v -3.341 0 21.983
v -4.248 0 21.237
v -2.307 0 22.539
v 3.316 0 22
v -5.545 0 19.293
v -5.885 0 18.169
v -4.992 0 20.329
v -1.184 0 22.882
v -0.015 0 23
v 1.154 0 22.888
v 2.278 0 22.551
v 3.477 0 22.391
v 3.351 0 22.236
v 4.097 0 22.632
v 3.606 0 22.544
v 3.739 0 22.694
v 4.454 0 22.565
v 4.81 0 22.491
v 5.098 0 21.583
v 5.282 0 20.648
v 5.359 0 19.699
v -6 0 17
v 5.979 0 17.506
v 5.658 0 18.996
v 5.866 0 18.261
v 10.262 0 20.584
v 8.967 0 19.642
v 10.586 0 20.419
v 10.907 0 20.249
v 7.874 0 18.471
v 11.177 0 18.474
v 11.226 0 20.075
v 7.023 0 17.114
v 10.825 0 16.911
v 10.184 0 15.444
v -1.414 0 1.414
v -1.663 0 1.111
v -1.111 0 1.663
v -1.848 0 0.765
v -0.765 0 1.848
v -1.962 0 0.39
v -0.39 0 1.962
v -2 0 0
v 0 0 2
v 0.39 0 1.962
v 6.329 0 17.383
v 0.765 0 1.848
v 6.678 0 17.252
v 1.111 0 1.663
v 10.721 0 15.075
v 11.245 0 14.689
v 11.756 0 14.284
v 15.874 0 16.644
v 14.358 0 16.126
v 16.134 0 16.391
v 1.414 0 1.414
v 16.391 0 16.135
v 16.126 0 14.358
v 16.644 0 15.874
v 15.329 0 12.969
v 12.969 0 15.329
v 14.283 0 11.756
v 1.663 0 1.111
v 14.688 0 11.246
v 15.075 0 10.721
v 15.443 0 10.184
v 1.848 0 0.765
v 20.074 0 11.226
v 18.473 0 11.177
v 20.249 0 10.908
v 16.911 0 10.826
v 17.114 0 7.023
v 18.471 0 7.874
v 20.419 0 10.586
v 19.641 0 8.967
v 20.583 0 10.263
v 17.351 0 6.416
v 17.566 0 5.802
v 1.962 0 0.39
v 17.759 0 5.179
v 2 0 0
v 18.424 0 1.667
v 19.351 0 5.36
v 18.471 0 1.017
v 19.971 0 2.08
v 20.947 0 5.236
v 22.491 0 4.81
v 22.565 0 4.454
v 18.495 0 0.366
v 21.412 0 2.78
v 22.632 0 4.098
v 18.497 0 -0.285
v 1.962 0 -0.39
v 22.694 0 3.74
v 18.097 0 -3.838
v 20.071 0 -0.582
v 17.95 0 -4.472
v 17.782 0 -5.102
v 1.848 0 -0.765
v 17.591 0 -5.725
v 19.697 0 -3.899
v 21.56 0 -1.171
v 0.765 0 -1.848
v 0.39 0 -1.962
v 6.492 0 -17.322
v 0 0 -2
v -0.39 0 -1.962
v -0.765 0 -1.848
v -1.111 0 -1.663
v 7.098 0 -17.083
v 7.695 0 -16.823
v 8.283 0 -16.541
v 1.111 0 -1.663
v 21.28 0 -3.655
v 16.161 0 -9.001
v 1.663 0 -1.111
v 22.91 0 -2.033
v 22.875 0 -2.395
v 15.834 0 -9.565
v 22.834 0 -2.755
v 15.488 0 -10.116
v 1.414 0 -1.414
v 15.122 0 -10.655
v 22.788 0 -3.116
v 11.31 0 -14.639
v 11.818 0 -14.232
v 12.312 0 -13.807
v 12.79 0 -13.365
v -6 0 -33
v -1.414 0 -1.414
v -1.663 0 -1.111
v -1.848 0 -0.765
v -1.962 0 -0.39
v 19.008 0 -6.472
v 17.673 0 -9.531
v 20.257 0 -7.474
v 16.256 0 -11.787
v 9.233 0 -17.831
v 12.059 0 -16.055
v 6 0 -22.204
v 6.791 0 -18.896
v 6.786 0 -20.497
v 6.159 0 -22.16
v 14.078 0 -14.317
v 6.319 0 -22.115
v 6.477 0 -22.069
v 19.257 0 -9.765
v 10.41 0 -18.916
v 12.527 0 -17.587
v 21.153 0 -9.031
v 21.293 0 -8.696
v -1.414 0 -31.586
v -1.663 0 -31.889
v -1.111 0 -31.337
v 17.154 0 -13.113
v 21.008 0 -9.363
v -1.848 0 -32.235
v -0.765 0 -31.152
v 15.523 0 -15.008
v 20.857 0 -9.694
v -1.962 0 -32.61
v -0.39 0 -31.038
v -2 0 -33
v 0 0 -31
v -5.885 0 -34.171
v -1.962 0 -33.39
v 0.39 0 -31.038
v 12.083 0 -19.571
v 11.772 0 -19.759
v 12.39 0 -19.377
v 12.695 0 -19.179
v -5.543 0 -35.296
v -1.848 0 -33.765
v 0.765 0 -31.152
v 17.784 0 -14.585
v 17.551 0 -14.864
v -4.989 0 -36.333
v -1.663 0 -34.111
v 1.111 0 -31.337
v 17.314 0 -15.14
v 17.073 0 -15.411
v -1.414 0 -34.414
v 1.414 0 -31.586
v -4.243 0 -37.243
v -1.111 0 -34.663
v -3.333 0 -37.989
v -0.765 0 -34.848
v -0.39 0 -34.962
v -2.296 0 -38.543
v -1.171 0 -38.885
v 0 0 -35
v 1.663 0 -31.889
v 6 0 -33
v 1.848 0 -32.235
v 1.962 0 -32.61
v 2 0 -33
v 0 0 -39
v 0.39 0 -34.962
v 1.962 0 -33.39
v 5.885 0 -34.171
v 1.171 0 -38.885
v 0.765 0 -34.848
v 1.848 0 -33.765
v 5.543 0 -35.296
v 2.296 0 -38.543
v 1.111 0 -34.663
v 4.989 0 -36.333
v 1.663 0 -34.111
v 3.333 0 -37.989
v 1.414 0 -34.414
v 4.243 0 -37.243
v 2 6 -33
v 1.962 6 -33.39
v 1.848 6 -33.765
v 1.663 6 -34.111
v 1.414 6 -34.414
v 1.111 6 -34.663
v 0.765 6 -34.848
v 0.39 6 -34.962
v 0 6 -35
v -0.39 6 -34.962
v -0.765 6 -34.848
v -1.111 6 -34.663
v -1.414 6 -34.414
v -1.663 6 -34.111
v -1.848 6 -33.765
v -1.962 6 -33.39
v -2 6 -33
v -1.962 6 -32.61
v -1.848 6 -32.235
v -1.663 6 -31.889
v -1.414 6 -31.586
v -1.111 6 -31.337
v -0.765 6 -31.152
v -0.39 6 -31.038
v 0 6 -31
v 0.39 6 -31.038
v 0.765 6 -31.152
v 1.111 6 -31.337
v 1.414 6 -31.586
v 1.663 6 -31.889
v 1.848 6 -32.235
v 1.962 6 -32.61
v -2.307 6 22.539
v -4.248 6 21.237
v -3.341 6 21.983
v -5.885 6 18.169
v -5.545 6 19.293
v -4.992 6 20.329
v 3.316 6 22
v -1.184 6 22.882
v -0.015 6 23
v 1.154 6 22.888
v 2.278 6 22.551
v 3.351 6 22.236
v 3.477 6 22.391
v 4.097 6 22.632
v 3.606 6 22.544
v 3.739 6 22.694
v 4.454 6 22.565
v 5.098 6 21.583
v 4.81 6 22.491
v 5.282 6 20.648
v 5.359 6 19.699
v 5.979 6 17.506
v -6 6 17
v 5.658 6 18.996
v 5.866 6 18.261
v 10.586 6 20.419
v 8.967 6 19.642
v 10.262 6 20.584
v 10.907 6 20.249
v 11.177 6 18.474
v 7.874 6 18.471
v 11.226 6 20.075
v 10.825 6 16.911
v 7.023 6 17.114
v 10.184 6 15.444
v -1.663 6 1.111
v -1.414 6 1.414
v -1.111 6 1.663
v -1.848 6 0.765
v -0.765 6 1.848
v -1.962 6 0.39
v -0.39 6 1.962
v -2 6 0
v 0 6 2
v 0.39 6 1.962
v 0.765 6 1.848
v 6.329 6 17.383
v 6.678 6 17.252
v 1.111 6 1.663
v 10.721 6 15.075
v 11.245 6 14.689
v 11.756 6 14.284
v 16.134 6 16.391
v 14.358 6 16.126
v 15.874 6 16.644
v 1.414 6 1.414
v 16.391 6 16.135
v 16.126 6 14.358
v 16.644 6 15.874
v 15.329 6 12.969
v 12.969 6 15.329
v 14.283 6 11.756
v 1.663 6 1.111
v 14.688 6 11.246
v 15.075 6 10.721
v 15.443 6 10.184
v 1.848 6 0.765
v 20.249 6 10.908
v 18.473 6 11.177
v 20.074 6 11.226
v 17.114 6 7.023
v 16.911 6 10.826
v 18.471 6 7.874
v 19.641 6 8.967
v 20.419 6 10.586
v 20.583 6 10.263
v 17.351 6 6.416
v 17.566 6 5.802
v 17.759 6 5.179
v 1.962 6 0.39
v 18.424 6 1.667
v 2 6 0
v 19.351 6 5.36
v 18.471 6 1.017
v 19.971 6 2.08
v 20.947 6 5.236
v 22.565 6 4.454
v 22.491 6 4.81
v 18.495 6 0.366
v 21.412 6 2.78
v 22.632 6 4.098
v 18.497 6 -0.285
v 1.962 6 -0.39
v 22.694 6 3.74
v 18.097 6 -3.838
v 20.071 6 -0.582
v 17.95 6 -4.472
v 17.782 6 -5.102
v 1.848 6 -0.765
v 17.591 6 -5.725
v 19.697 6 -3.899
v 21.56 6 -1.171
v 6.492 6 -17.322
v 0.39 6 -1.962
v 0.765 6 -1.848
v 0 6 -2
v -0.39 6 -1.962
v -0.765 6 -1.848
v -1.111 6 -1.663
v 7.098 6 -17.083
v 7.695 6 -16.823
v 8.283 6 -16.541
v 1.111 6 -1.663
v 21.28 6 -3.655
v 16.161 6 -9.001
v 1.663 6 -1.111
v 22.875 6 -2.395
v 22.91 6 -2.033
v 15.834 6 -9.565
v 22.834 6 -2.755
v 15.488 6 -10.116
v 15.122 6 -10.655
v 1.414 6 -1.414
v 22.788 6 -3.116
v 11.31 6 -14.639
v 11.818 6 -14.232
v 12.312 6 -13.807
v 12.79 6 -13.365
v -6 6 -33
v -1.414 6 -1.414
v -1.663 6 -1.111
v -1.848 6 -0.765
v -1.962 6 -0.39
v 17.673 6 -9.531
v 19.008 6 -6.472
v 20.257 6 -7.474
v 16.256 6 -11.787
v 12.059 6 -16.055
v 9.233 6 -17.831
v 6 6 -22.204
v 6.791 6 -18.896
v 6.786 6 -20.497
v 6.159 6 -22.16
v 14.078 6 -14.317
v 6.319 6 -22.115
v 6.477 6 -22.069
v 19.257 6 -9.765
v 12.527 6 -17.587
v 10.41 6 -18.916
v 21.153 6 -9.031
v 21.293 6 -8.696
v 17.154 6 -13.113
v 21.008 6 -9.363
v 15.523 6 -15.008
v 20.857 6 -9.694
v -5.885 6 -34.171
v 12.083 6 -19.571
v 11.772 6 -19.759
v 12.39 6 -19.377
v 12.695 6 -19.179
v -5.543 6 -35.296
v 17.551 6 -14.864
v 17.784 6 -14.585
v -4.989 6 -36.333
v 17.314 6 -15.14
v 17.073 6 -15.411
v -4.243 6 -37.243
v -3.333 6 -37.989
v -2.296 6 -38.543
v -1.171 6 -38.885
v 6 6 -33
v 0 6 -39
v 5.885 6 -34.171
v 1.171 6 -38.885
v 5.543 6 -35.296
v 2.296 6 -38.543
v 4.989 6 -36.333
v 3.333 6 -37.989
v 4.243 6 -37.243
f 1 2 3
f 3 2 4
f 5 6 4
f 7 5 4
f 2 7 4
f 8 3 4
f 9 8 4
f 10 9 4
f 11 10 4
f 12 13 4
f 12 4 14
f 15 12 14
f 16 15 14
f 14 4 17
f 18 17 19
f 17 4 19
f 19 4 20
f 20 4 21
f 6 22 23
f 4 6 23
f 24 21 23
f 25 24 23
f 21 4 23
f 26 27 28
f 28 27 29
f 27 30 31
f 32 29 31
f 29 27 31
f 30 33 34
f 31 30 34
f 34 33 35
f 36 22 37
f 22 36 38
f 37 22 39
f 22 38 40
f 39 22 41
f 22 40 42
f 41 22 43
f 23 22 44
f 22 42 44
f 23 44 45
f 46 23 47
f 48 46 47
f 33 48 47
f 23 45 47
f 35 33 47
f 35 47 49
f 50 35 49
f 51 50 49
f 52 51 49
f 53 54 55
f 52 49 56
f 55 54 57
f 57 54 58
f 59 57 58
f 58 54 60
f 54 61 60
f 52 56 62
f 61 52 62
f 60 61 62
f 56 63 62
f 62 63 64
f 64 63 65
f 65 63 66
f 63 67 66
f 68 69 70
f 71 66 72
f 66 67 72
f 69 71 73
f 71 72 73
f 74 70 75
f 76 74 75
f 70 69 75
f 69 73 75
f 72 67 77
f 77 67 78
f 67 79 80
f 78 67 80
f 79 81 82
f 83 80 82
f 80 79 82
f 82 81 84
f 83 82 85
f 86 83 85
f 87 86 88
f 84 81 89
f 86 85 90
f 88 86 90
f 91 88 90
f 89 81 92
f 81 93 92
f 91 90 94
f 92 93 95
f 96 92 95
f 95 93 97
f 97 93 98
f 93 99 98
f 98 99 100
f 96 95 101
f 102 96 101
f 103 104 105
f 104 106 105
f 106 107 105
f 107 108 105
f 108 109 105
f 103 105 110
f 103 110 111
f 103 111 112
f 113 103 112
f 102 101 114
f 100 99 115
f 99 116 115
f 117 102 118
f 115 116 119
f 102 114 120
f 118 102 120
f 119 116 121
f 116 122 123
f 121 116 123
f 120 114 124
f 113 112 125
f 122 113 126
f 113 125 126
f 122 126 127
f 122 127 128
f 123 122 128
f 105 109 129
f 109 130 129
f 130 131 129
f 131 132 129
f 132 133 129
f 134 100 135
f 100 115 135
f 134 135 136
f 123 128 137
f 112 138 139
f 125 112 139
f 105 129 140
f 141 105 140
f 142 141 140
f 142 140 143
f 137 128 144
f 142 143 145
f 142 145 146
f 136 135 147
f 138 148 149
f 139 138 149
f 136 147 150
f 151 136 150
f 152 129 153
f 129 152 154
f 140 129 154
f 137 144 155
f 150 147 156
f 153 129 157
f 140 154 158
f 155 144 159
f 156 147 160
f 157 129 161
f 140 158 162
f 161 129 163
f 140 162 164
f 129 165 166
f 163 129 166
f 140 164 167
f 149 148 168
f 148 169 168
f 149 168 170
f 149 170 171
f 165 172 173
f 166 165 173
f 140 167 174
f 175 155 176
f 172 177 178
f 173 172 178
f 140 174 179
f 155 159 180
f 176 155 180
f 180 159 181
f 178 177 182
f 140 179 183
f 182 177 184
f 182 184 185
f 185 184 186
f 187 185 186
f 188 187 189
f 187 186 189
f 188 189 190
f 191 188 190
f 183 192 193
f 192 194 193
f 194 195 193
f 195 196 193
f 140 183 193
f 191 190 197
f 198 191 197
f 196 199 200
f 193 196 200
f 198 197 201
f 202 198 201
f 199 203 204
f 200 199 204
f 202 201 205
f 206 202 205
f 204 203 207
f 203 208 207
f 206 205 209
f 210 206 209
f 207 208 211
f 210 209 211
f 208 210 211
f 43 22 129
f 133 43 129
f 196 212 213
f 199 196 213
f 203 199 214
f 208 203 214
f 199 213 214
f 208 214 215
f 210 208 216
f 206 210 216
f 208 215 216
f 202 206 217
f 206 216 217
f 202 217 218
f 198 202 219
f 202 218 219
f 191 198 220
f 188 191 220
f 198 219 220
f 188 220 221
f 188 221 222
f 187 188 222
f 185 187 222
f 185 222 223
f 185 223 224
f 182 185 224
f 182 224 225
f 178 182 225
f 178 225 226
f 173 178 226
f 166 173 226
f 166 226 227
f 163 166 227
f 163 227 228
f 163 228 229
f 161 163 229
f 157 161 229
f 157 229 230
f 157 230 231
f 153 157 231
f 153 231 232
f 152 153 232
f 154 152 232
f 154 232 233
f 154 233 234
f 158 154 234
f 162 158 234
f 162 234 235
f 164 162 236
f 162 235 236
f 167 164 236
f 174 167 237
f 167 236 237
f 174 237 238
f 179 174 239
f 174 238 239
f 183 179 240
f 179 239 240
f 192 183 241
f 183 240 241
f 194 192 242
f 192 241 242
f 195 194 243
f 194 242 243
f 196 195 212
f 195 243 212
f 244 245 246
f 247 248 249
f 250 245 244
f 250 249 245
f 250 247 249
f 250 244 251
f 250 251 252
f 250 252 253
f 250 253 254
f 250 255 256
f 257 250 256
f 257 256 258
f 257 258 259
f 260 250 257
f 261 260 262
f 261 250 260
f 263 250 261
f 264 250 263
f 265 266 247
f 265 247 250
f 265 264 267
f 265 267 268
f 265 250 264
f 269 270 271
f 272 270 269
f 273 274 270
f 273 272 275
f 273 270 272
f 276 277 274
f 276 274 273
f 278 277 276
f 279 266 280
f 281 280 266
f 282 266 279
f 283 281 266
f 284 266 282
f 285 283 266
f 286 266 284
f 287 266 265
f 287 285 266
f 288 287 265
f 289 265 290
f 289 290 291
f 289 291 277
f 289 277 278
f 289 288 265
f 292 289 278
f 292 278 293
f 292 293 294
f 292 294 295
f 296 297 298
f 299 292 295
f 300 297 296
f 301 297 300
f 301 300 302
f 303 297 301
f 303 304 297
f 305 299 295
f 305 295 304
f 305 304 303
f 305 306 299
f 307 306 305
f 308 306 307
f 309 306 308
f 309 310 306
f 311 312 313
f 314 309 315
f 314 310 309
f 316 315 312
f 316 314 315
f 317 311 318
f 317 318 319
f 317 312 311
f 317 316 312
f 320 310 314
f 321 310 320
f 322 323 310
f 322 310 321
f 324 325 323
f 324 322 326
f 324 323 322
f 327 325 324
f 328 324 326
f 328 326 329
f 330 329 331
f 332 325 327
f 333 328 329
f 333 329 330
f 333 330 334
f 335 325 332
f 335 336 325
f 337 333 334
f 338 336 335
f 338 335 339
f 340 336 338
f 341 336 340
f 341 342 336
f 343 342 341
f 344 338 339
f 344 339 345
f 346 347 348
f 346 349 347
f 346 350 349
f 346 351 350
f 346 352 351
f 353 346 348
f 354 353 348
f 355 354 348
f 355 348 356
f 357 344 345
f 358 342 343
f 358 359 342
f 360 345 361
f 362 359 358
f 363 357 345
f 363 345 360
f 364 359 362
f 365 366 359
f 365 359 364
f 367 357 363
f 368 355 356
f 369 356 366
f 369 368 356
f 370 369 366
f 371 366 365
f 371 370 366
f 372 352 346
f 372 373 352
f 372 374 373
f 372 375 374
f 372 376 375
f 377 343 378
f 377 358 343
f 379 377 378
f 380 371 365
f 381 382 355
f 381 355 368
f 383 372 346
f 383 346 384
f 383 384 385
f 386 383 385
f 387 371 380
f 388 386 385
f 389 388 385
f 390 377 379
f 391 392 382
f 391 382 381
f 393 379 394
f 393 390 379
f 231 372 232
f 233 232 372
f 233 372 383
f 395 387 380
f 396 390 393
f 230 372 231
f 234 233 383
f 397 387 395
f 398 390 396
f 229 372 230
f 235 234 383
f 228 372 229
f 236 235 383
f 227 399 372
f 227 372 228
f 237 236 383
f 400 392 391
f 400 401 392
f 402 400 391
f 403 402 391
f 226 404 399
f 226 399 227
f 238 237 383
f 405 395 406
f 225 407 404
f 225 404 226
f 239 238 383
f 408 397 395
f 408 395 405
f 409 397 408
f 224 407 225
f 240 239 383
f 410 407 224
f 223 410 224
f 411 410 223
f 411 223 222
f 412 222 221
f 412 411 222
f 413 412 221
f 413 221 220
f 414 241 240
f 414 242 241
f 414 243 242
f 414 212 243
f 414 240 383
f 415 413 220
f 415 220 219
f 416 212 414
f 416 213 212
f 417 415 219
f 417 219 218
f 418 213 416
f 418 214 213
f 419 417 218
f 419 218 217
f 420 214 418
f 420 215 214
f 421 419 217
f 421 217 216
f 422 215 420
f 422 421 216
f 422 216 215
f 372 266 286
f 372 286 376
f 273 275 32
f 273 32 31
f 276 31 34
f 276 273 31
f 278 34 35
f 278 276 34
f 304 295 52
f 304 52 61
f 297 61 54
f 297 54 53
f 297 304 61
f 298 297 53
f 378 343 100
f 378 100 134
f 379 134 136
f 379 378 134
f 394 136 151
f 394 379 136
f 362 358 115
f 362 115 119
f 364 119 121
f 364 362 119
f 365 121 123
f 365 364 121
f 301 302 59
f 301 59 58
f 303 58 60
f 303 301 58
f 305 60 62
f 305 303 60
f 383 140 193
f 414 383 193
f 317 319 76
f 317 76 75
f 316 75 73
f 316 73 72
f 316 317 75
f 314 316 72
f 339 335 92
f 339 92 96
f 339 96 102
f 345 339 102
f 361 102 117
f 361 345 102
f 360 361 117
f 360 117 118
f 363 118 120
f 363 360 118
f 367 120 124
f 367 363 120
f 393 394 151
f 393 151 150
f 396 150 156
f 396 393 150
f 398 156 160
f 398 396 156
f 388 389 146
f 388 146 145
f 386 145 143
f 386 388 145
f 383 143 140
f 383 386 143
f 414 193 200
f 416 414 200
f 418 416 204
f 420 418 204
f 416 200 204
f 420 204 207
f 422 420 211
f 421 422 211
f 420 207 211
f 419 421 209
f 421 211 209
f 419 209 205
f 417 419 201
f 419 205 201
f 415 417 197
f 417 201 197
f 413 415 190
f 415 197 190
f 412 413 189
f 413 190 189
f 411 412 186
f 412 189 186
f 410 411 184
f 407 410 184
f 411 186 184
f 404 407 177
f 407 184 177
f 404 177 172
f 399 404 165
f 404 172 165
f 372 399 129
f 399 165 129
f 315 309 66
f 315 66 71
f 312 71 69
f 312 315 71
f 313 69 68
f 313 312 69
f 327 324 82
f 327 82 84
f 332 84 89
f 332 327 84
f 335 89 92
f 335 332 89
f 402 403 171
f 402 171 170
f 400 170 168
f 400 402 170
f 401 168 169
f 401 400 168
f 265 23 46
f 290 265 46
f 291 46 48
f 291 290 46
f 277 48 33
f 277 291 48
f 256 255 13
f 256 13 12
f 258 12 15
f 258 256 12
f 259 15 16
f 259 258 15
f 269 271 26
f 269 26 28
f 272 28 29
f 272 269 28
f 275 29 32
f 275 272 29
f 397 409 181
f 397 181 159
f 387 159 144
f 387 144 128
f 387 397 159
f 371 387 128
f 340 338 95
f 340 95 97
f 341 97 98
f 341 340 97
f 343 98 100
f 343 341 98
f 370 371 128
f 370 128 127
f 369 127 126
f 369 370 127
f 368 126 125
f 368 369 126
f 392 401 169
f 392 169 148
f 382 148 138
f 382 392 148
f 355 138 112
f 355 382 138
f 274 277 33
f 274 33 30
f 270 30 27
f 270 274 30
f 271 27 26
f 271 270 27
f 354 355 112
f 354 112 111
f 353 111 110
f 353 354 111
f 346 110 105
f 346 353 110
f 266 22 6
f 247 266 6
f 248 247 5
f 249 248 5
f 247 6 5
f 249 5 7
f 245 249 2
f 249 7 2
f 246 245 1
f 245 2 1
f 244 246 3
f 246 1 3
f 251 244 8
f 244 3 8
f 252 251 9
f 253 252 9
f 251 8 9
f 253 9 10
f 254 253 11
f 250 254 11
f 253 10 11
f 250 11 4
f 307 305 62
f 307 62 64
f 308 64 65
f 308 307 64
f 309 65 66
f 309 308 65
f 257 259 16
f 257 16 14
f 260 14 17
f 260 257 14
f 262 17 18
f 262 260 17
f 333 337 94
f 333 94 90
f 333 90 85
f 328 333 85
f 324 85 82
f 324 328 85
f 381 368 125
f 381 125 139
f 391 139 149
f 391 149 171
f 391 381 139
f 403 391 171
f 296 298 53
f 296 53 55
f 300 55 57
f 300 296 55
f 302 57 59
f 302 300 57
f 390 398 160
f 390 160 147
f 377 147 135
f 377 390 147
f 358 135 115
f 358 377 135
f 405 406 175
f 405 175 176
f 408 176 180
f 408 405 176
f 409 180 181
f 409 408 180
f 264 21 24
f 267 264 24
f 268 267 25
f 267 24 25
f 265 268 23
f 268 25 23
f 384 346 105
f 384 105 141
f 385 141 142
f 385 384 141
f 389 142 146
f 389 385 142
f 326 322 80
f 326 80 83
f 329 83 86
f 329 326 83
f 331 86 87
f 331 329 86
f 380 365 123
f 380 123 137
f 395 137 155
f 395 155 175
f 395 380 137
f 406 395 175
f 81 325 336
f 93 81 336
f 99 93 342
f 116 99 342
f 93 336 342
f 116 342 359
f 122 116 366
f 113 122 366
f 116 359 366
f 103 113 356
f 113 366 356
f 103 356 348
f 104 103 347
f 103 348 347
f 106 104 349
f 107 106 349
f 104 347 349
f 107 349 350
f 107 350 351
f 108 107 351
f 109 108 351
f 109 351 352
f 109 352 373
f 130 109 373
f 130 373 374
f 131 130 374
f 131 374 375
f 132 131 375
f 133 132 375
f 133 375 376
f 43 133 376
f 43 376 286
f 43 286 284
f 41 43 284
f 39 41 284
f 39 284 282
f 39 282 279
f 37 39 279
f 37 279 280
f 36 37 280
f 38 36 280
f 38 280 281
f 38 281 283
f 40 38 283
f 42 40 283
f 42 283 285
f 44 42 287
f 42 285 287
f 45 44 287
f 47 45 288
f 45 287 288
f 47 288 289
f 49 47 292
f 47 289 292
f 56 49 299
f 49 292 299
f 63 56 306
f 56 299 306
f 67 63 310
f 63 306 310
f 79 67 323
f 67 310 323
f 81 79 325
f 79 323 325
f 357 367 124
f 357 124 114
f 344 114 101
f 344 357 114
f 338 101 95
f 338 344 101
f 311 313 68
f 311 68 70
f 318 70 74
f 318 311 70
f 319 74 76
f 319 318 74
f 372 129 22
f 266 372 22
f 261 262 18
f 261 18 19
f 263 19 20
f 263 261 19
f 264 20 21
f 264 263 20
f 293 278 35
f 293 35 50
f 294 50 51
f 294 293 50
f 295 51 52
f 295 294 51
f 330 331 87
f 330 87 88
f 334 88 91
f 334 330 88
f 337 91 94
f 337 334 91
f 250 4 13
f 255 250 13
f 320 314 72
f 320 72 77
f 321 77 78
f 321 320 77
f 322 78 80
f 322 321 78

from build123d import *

# Parameters (mm, degrees)
BOSS_EXTRUDE1_DEPTH = 6
BOSS_EXTRUDE2_DEPTH = 6
SKETCH2_R           = 2
CUT_EXTRUDE1_DEPTH  = 7


with BuildPart() as part:
    # Sketch1 → Boss-Extrude1 (new body)
    with BuildSketch(Plane(origin=(0, 0, 0), x_dir=(1, 0, 0), z_dir=(0, 1, 0))):
        with BuildLine():
            Line((5.999994922, -17.000000726), (6.000000976, 32.999999274))
            ThreePointArc((6.000000976, 32.999999274), (3.1827e-05, 38.999972559), (-5.999944142, 33.000006094))
            Line((-5.999944142, 33.000006094), (-5.999994922, -16.999993906))
            ThreePointArc((-5.999994922, -16.999993906), (-3.41e-06, -22.999994922), (5.999994922, -17.000000726))
        make_face()
    extrude(amount=BOSS_EXTRUDE1_DEPTH)

    # Sketch4 → Boss-Extrude2 (add)
    with BuildSketch(Plane(origin=(0, 6, 0), x_dir=(1, 0, 0), z_dir=(0, 1, 0))):
        with BuildLine():
            Line((-2.743025532, 18.19970901), (3.351302477, -22.235567688))
            ThreePointArc((3.351302477, -22.235567688), (3.541272199, -22.468242769), (3.739439393, -22.693977021))
            ThreePointArc((3.739439393, -22.693977021), (4.275797924, -22.599060868), (4.809758376, -22.491470036))
            ThreePointArc((4.809758376, -22.491470036), (5.335701359, -20.15196829), (5.179210857, -17.759188492))
            ThreePointArc((5.179210857, -17.759188492), (6.10970176, -17.460943428), (7.023146788, -17.113982885))
            ThreePointArc((7.023146788, -17.113982885), (8.392641943, -19.082324182), (10.262473747, -20.583528186))
            ThreePointArc((10.262473747, -20.583528186), (10.747026347, -20.334734439), (11.225551479, -20.074535959))
            ThreePointArc((11.225551479, -20.074535959), (11.038548046, -17.683947297), (10.183725752, -15.443598376))
            ThreePointArc((10.183725752, -15.443598376), (10.984968279, -14.884336496), (11.755563092, -14.283547788))
            ThreePointArc((11.755563092, -14.283547788), (13.644394202, -15.760775419), (15.873642273, -16.644142542))
            ThreePointArc((15.873642273, -16.644142542), (16.263334316, -16.263577617), (16.643905071, -15.873891267))
            ThreePointArc((16.643905071, -15.873891267), (15.760571298, -13.644629981), (14.283371923, -11.755776772))
            ThreePointArc((14.283371923, -11.755776772), (14.884172159, -10.985190947), (15.443446026, -10.183956787))
            ThreePointArc((15.443446026, -10.183956787), (17.683782158, -11.038812596), (20.074368023, -11.225851792))
            ThreePointArc((20.074368023, -11.225851792), (20.334573661, -10.747330553), (20.583374658, -10.262781675))
            ThreePointArc((20.583374658, -10.262781675), (19.082198626, -8.392927413), (17.113877817, -7.023402811))
            ThreePointArc((17.113877817, -7.023402811), (17.460852025, -6.109962974), (17.759111009, -5.179476534))
            ThreePointArc((17.759111009, -5.179476534), (20.151888466, -5.336002831), (22.491398079, -4.810094847))
            ThreePointArc((22.491398079, -4.810094847), (22.5989969, -4.276136005), (22.693921077, -3.739778893))
            ThreePointArc((22.693921077, -3.739778893), (20.708288865, -2.395476413), (18.423740564, -1.66696869))
            ThreePointArc((18.423740564, -1.66696869), (18.486058563, -0.691837978), (18.496801044, 0.285222939))
            ThreePointArc((18.496801044, 0.285222939), (20.829411048, 0.840934203), (22.909968714, 2.033060135))
            ThreePointArc((22.909968714, 2.033060135), (22.855400089, 2.575011992), (22.788013017, 3.115519655))
            ThreePointArc((22.788013017, 3.115519655), (20.494356761, 3.814823179), (18.096573111, 3.837582915))
            ThreePointArc((18.096573111, 3.837582915), (17.868697673, 4.787759858), (17.590969135, 5.724579102))
            ThreePointArc((17.590969135, 5.724579102), (19.656149051, 6.943150542), (21.29288809, 8.695568802))
            ThreePointArc((21.29288809, 8.695568802), (21.081000682, 9.197358874), (20.857289998, 9.69399061))
            ThreePointArc((20.857289998, 9.69399061), (18.459411122, 9.686158991), (16.161445721, 9.001148437))
            ThreePointArc((16.161445721, 9.001148437), (15.66362458, 9.84194422), (15.122102421, 10.65528129))
            ThreePointArc((15.122102421, 10.65528129), (16.73635195, 12.428437486), (17.783840917, 14.58543802))
            ThreePointArc((17.783840917, 14.58543802), (17.433461851, 15.002480058), (17.073305232, 15.411107957))
            ThreePointArc((17.073305232, 15.411107957), (14.784265796, 14.696837069), (12.790302956, 13.36492242))
            ThreePointArc((12.790302956, 13.36492242), (12.066769703, 14.021628648), (11.309570545, 14.639214975))
            ThreePointArc((11.309570545, 14.639214975), (12.329456533, 16.809403218), (12.694621435, 19.179327064))
            ThreePointArc((12.694621435, 19.179327064), (12.23688343, 19.474565051), (11.77228237, 19.758880732))
            ThreePointArc((11.77228237, 19.758880732), (9.795473575, 18.401636677), (8.282685644, 16.541164395))
            ThreePointArc((8.282685644, 16.541164395), (7.397729384, 16.955429837), (6.492133694, 17.322390167))
            ThreePointArc((6.492133694, 17.322390167), (6.827034796, 19.696779708), (6.477429129, 22.069048731))
            ThreePointArc((6.477429129, 22.069048731), (5.953004215, 22.216249477), (5.425240559, 22.350990244))
            ThreePointArc((5.425240559, 22.350990244), (3.912805358, 20.430687649), (3.017264913, 18.156258137))
            ThreePointArc((3.017264913, 18.156258137), (0.138830127, 18.404736437), (-2.743025532, 18.19970901))
        make_face()
    extrude(amount=-BOSS_EXTRUDE2_DEPTH)

    # Sketch2 → Cut-Extrude1 (cut, through all)
    with BuildSketch(Plane(origin=(0, 6, 0), x_dir=(1, 0, 0), z_dir=(0, 1, 0))):
        Circle(SKETCH2_R)
        with Locations((0, 33)):
            Circle(SKETCH2_R)
    extrude(amount=-CUT_EXTRUDE1_DEPTH, mode=Mode.SUBTRACT)


solid = part.part
